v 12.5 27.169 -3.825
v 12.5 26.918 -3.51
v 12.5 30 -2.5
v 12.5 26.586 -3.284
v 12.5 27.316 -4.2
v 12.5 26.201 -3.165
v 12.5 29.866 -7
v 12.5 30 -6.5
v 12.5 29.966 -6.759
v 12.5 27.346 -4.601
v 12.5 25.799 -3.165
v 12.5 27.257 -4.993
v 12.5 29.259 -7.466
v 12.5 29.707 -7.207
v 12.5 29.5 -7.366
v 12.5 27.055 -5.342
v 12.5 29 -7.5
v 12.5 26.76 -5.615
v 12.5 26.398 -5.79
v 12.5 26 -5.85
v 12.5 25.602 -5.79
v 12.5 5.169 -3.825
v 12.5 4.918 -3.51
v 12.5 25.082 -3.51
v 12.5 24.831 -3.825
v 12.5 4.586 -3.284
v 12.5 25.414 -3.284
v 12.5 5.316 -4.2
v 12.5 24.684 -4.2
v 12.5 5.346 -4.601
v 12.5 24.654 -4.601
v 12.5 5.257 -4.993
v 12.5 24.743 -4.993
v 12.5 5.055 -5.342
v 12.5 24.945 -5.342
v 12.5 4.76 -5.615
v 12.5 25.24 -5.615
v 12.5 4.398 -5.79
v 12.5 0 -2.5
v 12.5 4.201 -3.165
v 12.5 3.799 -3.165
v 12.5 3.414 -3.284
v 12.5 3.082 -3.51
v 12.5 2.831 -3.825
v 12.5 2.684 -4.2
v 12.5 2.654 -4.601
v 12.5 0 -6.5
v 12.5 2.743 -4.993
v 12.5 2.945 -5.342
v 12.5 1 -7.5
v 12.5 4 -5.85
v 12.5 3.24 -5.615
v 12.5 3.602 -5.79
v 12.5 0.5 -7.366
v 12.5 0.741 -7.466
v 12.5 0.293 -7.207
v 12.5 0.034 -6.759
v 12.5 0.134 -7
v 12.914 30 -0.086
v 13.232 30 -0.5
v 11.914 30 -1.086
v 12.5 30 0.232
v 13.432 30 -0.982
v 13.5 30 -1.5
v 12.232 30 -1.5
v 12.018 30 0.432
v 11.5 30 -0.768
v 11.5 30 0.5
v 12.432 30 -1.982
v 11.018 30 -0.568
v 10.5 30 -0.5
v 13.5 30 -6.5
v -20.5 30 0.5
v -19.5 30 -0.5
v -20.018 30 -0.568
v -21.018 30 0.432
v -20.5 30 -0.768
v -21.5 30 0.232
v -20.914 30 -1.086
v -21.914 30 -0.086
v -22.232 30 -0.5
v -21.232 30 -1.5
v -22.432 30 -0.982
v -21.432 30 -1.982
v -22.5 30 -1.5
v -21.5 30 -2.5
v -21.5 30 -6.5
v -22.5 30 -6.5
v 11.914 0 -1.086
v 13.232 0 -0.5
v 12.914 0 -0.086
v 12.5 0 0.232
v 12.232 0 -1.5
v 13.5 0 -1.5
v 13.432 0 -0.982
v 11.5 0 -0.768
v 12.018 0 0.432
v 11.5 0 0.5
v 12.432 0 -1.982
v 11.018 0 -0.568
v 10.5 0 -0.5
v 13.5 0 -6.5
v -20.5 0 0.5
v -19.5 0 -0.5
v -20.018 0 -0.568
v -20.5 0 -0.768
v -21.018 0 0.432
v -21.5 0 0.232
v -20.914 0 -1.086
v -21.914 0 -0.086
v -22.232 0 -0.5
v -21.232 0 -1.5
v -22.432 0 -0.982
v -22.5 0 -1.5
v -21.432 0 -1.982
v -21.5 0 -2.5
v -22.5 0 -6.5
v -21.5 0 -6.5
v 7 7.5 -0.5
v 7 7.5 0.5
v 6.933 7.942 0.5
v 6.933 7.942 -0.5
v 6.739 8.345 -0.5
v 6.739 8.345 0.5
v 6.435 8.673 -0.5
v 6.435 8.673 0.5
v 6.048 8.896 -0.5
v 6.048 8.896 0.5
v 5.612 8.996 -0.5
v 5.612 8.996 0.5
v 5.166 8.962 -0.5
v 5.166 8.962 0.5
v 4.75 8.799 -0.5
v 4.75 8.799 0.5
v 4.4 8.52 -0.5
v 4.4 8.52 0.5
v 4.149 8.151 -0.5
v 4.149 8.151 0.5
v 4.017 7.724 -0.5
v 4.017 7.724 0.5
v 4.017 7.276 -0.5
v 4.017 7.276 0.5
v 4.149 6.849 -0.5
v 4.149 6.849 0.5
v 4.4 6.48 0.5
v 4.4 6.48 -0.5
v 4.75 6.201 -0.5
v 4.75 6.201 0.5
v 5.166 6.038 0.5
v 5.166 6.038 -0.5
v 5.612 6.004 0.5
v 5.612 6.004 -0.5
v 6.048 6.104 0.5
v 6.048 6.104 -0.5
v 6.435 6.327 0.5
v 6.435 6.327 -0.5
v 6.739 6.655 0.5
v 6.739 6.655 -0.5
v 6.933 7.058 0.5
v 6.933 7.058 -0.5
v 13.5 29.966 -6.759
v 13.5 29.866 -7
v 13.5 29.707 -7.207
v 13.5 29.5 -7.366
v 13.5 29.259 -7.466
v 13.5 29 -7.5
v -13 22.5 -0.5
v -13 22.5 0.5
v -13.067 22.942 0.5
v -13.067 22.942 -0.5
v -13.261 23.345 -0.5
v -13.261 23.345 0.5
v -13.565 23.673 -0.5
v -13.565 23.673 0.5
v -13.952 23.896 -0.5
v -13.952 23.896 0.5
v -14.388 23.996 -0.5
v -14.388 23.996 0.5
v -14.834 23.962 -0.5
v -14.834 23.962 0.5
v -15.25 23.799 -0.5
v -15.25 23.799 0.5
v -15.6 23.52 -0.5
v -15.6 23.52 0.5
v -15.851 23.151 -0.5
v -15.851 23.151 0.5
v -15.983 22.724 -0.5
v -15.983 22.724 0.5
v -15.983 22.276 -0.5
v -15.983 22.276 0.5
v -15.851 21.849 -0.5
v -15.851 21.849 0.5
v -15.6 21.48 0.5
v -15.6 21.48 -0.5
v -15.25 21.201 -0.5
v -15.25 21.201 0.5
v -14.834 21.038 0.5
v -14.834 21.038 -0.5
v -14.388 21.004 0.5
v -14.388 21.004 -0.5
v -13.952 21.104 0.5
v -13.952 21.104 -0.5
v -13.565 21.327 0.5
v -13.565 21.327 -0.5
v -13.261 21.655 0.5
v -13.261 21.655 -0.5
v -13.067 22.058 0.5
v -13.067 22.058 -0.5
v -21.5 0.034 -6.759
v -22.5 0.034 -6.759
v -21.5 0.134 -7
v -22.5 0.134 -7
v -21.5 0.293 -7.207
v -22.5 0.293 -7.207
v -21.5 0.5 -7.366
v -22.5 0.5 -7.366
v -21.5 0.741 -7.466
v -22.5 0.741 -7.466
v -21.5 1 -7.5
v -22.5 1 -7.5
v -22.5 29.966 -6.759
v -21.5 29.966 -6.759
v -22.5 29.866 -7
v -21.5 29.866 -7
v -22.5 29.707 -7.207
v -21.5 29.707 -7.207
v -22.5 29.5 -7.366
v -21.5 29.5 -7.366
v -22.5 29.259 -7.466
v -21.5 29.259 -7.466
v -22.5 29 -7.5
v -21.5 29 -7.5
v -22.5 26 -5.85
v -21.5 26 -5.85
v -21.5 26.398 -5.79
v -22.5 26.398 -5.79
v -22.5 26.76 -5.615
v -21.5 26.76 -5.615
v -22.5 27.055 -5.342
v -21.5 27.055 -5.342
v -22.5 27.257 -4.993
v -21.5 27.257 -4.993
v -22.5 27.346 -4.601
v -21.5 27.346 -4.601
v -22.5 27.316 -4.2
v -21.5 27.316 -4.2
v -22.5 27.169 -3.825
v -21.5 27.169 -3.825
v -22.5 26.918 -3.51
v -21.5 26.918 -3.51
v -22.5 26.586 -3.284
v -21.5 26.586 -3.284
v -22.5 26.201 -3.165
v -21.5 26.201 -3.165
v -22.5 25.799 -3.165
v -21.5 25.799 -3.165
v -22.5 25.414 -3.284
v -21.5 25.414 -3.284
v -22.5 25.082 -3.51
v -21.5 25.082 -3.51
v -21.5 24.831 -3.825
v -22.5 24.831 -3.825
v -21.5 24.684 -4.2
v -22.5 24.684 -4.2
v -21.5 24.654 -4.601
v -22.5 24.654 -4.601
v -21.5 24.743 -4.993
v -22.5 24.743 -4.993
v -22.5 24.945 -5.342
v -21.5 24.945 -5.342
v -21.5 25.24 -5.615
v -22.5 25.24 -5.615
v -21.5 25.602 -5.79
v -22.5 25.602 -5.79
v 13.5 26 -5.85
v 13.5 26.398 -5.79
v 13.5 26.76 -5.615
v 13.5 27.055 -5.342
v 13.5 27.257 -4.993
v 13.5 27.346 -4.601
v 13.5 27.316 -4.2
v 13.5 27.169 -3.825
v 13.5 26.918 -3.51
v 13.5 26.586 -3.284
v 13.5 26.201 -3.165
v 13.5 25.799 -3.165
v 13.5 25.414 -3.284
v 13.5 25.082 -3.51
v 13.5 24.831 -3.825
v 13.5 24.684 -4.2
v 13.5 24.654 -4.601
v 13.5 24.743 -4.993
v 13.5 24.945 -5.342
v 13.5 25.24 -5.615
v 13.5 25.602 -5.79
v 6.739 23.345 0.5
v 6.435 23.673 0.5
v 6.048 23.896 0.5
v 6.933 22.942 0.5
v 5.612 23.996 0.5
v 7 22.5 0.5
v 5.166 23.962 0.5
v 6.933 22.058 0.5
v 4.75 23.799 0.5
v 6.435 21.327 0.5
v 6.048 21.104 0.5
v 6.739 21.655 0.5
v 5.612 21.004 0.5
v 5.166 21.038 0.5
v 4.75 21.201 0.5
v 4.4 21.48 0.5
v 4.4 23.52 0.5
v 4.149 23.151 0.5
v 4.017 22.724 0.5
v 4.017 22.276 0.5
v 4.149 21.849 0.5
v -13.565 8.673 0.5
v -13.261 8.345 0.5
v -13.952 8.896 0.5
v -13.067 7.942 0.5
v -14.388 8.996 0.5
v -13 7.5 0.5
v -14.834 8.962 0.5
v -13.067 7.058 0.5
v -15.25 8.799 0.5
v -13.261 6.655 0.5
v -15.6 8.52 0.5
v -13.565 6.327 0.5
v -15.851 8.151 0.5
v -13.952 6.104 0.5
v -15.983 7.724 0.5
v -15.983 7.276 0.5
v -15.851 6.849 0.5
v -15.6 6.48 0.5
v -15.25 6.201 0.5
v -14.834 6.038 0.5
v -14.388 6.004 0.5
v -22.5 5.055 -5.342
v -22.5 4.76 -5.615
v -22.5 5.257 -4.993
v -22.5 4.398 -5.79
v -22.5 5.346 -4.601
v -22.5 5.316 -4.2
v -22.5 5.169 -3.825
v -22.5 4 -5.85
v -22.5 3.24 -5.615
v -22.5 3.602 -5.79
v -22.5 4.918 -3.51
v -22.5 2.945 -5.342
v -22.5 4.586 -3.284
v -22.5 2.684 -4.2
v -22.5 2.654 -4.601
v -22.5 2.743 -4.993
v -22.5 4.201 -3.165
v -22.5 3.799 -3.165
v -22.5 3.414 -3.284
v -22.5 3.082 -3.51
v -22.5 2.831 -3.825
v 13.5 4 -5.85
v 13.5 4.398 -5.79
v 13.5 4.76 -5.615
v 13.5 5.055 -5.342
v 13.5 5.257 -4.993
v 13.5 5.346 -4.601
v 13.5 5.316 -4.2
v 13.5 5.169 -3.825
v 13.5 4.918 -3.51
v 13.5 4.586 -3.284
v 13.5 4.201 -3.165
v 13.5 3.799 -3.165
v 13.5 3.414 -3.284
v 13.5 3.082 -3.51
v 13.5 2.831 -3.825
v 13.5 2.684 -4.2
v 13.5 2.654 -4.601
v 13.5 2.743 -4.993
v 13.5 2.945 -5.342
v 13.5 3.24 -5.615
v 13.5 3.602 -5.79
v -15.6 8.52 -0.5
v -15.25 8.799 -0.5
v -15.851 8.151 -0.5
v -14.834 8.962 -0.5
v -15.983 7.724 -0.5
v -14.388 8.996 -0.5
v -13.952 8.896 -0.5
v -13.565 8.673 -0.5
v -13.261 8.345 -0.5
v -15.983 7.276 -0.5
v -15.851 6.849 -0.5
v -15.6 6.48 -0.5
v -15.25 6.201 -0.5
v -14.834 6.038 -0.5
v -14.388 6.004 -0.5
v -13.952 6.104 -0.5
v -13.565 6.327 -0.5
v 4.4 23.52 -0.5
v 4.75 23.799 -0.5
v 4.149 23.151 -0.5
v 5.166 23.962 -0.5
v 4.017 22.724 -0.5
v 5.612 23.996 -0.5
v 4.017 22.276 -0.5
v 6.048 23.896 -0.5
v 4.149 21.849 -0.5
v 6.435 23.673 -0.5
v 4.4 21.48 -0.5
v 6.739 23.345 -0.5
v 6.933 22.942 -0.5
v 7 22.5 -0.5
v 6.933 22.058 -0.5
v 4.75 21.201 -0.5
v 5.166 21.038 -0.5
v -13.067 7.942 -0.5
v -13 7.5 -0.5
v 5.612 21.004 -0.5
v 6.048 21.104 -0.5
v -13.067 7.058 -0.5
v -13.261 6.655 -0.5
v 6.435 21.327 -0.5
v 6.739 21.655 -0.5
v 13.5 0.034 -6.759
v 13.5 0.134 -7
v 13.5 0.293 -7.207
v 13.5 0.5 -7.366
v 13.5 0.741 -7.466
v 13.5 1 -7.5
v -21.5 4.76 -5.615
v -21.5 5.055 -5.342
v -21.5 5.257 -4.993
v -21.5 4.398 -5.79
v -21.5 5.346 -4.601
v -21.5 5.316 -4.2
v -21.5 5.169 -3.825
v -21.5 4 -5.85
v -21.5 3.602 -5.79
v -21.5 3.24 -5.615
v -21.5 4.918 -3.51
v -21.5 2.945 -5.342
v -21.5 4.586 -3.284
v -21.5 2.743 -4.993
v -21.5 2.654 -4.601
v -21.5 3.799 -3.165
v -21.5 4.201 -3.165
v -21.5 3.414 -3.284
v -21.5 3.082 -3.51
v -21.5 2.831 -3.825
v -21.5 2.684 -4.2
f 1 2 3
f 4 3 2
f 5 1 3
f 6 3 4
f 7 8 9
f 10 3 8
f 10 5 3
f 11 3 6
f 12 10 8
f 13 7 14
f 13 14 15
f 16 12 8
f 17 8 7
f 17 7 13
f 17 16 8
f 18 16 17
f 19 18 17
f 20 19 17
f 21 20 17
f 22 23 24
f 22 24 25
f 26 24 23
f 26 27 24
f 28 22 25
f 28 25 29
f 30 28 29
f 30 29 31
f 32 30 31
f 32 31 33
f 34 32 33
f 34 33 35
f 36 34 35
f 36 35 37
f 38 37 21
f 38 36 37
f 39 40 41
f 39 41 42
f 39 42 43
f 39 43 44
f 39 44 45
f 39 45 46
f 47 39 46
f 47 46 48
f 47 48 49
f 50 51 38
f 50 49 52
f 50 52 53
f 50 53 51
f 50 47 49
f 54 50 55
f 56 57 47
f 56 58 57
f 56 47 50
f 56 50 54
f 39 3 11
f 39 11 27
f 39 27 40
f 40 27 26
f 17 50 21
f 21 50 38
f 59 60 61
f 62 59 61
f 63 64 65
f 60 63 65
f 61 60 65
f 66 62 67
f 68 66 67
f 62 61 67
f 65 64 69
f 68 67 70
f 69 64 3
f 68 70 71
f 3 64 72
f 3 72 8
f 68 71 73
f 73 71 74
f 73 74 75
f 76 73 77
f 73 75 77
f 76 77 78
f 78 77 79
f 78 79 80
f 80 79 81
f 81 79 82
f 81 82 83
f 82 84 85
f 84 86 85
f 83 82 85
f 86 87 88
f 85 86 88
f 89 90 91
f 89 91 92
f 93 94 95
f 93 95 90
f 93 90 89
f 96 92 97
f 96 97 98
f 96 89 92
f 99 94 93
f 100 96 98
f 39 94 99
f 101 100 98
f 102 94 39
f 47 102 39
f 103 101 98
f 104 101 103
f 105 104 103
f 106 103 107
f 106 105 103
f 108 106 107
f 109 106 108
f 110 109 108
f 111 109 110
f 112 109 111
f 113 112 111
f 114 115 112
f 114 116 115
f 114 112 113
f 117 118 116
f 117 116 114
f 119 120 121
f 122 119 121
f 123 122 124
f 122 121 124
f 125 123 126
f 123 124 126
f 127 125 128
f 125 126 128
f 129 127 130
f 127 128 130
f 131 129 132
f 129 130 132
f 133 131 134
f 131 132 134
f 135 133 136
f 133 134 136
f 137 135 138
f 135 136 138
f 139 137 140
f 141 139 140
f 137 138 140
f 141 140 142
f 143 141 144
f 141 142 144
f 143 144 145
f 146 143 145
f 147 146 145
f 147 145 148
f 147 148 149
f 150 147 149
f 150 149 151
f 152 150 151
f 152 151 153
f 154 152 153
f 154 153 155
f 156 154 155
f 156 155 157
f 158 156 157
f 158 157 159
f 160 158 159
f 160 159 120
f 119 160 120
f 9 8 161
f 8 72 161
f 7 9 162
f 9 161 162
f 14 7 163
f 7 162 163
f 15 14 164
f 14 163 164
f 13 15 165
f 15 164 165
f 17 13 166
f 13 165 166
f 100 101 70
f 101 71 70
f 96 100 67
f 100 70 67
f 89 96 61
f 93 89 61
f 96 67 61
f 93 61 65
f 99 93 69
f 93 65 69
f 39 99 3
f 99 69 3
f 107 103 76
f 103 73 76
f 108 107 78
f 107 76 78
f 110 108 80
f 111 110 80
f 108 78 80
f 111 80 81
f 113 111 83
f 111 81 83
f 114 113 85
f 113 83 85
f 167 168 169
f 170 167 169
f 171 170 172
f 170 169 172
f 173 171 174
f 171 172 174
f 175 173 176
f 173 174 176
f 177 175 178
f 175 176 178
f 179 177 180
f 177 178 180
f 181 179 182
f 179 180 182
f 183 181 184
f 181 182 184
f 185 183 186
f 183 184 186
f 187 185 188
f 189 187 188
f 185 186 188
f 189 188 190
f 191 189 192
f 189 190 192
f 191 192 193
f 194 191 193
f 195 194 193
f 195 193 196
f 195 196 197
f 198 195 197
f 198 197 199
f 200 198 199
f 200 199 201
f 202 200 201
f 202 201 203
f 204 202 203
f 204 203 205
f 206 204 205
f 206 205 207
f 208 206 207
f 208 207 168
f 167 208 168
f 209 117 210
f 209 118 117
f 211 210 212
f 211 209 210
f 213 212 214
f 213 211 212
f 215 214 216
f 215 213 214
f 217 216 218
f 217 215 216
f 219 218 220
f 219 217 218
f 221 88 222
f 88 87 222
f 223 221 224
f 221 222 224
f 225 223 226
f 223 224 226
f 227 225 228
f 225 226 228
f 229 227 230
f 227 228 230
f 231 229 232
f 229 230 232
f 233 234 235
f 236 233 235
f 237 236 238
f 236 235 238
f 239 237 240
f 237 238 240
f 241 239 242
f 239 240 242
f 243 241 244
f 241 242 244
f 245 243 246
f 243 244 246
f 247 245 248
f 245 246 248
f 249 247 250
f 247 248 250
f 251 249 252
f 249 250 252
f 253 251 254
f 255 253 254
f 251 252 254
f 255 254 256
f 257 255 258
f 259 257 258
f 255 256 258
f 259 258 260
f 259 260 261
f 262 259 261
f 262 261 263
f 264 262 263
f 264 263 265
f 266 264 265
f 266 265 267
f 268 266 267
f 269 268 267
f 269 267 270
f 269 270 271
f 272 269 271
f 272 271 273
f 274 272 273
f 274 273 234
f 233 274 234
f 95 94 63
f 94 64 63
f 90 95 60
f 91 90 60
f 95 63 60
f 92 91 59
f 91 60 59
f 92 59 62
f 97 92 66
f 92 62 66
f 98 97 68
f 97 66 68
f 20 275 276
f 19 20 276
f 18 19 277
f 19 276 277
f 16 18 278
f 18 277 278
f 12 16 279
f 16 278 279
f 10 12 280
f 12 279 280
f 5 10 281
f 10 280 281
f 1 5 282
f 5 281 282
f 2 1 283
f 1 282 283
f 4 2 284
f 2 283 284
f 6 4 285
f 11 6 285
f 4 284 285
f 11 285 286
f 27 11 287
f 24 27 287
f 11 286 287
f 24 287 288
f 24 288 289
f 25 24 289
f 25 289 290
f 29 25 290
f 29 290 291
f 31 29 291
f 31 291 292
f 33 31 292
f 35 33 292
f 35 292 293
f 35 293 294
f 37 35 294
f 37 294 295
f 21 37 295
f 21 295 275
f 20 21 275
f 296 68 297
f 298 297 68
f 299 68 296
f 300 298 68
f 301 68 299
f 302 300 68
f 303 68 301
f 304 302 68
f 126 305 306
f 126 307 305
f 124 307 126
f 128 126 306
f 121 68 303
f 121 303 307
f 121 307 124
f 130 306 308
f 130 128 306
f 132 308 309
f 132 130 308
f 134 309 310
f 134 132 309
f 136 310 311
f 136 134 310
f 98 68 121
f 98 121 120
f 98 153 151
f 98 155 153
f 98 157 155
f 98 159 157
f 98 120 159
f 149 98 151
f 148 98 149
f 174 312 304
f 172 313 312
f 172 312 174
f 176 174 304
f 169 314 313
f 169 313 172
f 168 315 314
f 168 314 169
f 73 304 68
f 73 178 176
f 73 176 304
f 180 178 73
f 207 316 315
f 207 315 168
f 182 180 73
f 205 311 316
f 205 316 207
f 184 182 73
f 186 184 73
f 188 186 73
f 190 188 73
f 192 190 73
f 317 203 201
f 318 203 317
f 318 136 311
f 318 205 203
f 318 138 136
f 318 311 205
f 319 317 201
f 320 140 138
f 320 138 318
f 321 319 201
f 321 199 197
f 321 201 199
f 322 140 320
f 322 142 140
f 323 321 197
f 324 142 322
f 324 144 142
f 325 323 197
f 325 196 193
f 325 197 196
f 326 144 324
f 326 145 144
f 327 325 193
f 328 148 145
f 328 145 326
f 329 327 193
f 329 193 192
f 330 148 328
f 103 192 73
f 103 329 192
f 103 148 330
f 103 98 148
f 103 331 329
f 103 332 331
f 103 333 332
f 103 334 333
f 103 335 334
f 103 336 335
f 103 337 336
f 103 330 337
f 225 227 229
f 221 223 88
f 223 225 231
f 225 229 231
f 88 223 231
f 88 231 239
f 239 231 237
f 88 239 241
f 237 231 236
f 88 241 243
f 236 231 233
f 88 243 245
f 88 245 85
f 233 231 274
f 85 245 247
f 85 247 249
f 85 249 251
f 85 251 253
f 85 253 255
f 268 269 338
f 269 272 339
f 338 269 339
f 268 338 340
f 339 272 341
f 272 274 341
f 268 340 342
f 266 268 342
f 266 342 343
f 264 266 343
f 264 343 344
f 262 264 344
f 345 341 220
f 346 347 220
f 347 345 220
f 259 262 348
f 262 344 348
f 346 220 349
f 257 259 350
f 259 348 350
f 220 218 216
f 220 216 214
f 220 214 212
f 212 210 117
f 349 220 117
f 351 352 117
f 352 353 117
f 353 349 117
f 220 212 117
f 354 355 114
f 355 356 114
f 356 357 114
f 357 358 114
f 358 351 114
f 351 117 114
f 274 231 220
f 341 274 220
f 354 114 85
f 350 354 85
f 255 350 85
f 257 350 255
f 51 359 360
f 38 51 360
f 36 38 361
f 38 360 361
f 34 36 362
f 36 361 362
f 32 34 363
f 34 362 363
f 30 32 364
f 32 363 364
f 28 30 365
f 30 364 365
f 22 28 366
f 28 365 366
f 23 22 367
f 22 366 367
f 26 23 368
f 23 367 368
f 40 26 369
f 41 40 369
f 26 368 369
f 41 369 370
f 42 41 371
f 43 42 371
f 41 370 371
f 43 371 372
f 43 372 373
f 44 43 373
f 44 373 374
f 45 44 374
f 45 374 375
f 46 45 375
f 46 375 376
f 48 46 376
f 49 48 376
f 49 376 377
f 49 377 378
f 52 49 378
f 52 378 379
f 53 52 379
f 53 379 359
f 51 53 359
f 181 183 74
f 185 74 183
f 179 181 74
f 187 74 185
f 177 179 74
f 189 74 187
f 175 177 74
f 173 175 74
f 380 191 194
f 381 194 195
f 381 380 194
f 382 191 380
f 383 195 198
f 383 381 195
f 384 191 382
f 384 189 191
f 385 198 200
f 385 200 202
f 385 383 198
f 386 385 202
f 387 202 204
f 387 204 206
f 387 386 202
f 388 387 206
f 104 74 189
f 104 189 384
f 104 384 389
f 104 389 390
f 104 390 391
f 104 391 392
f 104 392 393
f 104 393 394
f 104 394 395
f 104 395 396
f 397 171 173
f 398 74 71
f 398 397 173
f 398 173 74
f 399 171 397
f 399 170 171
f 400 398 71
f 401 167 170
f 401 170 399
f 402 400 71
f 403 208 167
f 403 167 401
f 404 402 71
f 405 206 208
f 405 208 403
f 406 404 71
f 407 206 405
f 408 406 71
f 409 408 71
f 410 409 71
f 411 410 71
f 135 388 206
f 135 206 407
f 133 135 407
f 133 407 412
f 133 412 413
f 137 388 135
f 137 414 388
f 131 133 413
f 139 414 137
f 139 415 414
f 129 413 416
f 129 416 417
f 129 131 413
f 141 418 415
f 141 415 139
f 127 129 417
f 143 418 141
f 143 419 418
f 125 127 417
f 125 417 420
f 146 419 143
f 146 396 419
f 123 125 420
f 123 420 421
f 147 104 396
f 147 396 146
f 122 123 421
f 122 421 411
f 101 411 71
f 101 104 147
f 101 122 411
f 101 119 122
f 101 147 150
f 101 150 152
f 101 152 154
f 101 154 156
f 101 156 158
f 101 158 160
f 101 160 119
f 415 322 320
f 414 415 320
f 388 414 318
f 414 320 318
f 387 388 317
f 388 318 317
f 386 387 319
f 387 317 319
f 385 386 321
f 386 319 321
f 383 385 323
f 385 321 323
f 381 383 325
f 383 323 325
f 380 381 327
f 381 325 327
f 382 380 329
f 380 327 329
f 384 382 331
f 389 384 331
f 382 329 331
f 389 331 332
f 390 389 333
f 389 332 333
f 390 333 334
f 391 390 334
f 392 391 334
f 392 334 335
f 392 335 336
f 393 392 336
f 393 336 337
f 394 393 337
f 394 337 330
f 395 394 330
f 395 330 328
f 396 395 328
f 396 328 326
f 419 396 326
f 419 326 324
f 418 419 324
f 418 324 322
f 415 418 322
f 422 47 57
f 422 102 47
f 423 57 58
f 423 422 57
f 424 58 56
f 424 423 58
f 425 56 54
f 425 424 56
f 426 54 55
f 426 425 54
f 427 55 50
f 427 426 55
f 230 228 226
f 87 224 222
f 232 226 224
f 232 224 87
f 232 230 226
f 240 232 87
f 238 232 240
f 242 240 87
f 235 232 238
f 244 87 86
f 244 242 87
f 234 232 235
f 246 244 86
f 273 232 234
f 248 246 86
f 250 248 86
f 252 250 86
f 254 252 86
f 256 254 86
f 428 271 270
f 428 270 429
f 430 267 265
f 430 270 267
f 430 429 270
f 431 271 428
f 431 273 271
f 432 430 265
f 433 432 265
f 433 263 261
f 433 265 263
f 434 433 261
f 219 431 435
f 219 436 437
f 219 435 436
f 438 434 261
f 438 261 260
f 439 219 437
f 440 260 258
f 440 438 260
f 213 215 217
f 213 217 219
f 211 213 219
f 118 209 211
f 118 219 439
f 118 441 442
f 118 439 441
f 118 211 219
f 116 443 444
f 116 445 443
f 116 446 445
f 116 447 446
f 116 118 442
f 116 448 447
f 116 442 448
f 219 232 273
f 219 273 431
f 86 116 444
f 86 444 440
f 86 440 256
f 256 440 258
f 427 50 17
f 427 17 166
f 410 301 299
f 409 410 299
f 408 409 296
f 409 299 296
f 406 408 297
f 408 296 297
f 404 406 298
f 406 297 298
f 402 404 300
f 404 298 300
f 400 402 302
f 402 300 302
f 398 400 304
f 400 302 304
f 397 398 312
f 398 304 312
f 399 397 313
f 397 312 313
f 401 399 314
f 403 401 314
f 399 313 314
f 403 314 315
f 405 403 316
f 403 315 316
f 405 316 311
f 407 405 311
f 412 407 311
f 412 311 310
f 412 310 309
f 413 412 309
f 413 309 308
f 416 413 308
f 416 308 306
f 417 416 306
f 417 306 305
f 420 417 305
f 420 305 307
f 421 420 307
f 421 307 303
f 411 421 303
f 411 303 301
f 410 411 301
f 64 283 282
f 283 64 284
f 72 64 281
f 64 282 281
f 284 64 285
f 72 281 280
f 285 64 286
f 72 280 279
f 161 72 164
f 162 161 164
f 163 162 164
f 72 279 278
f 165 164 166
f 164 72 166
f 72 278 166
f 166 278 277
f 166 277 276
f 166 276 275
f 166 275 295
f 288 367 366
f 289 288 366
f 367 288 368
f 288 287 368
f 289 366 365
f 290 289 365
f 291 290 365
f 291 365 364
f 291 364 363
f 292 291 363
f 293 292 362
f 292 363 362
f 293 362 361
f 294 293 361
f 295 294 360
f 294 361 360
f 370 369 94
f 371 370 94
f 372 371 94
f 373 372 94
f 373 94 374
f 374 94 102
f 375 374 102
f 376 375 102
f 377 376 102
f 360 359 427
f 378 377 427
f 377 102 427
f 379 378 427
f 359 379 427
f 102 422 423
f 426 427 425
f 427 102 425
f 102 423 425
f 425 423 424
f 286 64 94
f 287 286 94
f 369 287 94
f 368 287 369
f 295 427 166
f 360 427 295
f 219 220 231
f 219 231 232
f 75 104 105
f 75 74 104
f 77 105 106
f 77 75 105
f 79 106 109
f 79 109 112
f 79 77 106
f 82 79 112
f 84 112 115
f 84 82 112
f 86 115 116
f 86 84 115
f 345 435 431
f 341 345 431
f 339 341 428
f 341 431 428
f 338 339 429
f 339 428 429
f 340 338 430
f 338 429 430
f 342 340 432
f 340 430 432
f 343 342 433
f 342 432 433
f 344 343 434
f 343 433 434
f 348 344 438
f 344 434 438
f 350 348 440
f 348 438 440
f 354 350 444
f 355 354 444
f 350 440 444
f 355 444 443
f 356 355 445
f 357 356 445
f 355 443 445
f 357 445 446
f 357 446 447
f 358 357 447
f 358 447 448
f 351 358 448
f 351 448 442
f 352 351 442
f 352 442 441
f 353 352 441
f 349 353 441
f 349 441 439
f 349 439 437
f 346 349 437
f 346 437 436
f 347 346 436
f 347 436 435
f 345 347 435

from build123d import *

# Parameters (mm, degrees)
BOSS_EXTRUDE1_DEPTH = 30
FILLET2_R           = 2
SKETCH3_R           = 1.5
CUT_EXTRUDE4_DEPTH  = 9
SKETCH4_R           = 1.35
CUT_EXTRUDE3_DEPTH  = 37
FILLET3_R           = 1


with BuildPart() as part:
    # Sketch1 → Boss-Extrude1 (new body)
    with BuildSketch(Plane(origin=(0, 0, 0), x_dir=(1, 0, 0), z_dir=(0, 1, 0))):
        Polygon((-21.5, 0.5), (12.5, 0.5), (12.5, 7.5), (13.5, 7.5), (13.5, 0.5), (13.5, -0.5), (-22.5, -0.5), (-22.5, 0.5), (-22.5, 7.5), (-21.5, 7.5), align=None)
    extrude(amount=BOSS_EXTRUDE1_DEPTH)

    # Fillet2
    fillet2_edges = [part.edges().sort_by_distance(p)[0] for p in [
        (13.5, 15, 0.5),
        (-22.5, 15, 0.5),
        (-21.5, 15, -0.5),
        (12.5, 15, -0.5),
    ]]
    fillet(fillet2_edges, radius=FILLET2_R)

    # Sketch3 → Cut-Extrude4 (cut, through all)
    with BuildSketch(Plane.XY.offset(0.5)):
        with Locations((-14.5, 22.5)):
            Circle(SKETCH3_R)
        with Locations((5.5, 22.5)):
            Circle(SKETCH3_R)
        with Locations((-14.5, 7.5)):
            Circle(SKETCH3_R)
        with Locations((5.5, 7.5)):
            Circle(SKETCH3_R)
    extrude(amount=-CUT_EXTRUDE4_DEPTH, mode=Mode.SUBTRACT)

    # Sketch4 → Cut-Extrude3 (cut, through all)
    with BuildSketch(Plane(origin=(13.5, 0, 0), x_dir=(0, 0, -1), z_dir=(1, 0, 0))):
        with Locations((4.5, 26)):
            Circle(SKETCH4_R)
        with Locations((4.5, 4)):
            Circle(SKETCH4_R)
    extrude(amount=-CUT_EXTRUDE3_DEPTH, mode=Mode.SUBTRACT)

    # Fillet3
    fillet3_edges = [part.edges().sort_by_distance(p)[0] for p in [
        (13, 30, -7.5),
        (-22, 0, -7.5),
        (13, 0, -7.5),
        (-22, 30, -7.5),
    ]]
    fillet(fillet3_edges, radius=FILLET3_R)


solid = part.part
